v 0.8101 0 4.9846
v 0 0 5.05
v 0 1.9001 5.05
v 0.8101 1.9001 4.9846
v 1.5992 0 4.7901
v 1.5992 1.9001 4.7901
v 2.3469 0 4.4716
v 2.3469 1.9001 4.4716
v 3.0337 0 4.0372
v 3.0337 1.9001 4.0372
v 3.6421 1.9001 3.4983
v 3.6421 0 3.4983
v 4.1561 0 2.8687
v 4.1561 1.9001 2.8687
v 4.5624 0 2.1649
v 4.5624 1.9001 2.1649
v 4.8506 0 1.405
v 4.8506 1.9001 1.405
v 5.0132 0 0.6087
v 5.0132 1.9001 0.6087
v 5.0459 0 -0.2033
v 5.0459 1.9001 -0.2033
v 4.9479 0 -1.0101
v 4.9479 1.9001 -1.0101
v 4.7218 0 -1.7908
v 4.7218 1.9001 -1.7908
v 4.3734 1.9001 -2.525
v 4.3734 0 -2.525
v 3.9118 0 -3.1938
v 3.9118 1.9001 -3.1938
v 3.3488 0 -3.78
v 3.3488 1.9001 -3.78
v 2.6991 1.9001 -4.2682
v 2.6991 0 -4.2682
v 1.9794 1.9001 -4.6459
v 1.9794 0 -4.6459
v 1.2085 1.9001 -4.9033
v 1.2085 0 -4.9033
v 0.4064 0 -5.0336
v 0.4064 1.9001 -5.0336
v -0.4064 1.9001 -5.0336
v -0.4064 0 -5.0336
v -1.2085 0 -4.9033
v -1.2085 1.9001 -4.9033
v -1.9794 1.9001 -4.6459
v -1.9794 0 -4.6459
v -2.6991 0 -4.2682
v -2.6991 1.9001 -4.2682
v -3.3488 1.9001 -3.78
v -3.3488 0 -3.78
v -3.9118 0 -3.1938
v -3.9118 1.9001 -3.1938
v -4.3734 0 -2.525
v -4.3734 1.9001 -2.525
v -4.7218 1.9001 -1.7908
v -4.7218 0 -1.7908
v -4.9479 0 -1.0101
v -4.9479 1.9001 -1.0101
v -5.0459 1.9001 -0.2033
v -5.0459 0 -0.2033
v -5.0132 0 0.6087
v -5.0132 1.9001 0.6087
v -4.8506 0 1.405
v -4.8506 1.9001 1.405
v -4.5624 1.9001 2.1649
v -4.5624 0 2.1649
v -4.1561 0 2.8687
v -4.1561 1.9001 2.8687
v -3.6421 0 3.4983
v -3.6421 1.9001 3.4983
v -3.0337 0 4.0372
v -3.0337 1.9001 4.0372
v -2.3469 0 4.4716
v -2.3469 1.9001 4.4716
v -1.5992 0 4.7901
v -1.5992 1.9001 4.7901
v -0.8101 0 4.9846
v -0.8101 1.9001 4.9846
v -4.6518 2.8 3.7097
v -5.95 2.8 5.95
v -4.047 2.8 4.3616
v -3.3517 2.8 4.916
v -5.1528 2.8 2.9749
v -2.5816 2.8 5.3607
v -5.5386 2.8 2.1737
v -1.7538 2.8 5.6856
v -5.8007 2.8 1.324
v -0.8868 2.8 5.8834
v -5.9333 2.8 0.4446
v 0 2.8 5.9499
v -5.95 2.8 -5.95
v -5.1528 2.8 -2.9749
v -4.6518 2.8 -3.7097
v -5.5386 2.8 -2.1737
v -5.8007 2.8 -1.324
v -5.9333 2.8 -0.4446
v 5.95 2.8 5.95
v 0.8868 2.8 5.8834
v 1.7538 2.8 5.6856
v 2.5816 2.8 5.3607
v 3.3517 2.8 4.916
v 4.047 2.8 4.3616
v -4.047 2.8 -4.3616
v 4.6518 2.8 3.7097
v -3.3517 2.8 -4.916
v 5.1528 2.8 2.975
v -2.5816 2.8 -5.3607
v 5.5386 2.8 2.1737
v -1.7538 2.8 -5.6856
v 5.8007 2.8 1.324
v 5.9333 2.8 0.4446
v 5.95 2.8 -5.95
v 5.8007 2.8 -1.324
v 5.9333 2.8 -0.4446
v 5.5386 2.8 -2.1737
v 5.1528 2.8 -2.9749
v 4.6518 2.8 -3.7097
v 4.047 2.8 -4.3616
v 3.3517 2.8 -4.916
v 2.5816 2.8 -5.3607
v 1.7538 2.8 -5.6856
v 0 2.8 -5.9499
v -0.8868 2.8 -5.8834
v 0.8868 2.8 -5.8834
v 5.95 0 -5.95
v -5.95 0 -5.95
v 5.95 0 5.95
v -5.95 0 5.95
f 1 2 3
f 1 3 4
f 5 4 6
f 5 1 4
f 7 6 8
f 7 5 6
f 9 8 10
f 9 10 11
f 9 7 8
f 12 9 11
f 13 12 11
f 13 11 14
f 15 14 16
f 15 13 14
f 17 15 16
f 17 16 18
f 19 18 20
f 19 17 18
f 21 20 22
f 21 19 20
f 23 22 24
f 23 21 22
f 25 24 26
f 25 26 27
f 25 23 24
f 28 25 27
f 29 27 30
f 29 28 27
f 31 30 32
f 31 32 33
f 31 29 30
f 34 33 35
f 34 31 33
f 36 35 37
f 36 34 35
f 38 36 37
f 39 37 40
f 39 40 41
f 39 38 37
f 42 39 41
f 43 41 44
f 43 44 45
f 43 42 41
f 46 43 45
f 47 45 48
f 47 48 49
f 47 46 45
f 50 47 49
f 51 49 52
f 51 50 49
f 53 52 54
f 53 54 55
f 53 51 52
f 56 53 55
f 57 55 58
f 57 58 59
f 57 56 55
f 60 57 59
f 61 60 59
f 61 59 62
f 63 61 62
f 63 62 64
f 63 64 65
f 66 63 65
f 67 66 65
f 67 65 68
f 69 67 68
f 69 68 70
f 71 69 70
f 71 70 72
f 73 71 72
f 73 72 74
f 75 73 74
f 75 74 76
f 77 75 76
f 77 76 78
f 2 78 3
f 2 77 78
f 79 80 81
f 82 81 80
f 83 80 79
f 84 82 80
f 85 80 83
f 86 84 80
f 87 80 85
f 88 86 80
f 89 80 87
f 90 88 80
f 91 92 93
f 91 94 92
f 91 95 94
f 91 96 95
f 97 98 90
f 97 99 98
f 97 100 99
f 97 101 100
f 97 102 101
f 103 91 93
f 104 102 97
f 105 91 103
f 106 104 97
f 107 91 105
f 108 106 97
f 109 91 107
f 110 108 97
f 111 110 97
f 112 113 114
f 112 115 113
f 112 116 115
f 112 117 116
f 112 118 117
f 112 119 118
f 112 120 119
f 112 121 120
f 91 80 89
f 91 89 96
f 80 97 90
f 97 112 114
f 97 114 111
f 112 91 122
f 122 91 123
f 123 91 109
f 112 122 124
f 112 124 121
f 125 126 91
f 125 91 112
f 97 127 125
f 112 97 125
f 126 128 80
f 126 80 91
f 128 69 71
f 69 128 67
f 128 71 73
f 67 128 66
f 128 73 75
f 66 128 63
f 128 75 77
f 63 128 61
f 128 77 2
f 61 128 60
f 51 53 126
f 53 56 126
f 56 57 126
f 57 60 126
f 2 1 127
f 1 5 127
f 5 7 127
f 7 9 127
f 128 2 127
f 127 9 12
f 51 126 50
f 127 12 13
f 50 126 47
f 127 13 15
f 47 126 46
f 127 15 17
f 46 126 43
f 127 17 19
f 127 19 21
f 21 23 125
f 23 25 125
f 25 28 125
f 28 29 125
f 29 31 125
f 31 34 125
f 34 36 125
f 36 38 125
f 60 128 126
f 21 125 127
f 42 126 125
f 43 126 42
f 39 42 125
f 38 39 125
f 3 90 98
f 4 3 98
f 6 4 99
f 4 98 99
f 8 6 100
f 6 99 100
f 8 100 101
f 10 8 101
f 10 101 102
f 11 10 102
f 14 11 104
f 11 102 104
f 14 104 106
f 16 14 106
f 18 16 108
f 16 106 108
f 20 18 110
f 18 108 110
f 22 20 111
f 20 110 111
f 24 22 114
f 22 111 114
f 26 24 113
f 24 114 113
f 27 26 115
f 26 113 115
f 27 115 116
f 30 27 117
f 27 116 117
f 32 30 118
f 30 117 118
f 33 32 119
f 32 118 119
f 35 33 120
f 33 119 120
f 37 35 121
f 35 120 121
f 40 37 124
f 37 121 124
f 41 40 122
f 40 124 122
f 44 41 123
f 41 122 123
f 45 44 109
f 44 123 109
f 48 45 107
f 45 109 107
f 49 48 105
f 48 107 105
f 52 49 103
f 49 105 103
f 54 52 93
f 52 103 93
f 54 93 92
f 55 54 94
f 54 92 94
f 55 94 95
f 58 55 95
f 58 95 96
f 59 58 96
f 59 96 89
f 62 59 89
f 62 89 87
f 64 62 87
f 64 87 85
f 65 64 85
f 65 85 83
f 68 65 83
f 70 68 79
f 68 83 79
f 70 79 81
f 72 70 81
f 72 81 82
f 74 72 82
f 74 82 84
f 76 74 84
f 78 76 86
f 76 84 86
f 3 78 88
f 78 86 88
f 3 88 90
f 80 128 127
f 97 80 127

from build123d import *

# Parameters (mm, degrees)
SKETCH_1_W      = 11.9
SKETCH_1_H      = 11.9
SKETCH_1_R      = 5.05
EXTRUDE_1_DEPTH = 2.8
CHAMFER_1_SIZE  = 0.9


with BuildPart() as part:
    # 草图1 → 凸台-拉伸1 (new body)
    with BuildSketch(Plane(origin=(0, 0, 0), x_dir=(1, 0, 0), z_dir=(0, 1, 0))):
        Rectangle(SKETCH_1_W, SKETCH_1_H)
        with Locations(Location((0, 0, 0), (0, 0, 270))):
            Circle(SKETCH_1_R, mode=Mode.SUBTRACT)
    extrude(amount=EXTRUDE_1_DEPTH)

    # 倒角1
    chamfer_1_edges = [part.edges().sort_by_distance(p)[0] for p in [
        (0, 2.8, -5.05),
    ]]
    chamfer(chamfer_1_edges, length=CHAMFER_1_SIZE - 0.0001)  # a hair under: the kernel refuses the full size


solid = part.part
